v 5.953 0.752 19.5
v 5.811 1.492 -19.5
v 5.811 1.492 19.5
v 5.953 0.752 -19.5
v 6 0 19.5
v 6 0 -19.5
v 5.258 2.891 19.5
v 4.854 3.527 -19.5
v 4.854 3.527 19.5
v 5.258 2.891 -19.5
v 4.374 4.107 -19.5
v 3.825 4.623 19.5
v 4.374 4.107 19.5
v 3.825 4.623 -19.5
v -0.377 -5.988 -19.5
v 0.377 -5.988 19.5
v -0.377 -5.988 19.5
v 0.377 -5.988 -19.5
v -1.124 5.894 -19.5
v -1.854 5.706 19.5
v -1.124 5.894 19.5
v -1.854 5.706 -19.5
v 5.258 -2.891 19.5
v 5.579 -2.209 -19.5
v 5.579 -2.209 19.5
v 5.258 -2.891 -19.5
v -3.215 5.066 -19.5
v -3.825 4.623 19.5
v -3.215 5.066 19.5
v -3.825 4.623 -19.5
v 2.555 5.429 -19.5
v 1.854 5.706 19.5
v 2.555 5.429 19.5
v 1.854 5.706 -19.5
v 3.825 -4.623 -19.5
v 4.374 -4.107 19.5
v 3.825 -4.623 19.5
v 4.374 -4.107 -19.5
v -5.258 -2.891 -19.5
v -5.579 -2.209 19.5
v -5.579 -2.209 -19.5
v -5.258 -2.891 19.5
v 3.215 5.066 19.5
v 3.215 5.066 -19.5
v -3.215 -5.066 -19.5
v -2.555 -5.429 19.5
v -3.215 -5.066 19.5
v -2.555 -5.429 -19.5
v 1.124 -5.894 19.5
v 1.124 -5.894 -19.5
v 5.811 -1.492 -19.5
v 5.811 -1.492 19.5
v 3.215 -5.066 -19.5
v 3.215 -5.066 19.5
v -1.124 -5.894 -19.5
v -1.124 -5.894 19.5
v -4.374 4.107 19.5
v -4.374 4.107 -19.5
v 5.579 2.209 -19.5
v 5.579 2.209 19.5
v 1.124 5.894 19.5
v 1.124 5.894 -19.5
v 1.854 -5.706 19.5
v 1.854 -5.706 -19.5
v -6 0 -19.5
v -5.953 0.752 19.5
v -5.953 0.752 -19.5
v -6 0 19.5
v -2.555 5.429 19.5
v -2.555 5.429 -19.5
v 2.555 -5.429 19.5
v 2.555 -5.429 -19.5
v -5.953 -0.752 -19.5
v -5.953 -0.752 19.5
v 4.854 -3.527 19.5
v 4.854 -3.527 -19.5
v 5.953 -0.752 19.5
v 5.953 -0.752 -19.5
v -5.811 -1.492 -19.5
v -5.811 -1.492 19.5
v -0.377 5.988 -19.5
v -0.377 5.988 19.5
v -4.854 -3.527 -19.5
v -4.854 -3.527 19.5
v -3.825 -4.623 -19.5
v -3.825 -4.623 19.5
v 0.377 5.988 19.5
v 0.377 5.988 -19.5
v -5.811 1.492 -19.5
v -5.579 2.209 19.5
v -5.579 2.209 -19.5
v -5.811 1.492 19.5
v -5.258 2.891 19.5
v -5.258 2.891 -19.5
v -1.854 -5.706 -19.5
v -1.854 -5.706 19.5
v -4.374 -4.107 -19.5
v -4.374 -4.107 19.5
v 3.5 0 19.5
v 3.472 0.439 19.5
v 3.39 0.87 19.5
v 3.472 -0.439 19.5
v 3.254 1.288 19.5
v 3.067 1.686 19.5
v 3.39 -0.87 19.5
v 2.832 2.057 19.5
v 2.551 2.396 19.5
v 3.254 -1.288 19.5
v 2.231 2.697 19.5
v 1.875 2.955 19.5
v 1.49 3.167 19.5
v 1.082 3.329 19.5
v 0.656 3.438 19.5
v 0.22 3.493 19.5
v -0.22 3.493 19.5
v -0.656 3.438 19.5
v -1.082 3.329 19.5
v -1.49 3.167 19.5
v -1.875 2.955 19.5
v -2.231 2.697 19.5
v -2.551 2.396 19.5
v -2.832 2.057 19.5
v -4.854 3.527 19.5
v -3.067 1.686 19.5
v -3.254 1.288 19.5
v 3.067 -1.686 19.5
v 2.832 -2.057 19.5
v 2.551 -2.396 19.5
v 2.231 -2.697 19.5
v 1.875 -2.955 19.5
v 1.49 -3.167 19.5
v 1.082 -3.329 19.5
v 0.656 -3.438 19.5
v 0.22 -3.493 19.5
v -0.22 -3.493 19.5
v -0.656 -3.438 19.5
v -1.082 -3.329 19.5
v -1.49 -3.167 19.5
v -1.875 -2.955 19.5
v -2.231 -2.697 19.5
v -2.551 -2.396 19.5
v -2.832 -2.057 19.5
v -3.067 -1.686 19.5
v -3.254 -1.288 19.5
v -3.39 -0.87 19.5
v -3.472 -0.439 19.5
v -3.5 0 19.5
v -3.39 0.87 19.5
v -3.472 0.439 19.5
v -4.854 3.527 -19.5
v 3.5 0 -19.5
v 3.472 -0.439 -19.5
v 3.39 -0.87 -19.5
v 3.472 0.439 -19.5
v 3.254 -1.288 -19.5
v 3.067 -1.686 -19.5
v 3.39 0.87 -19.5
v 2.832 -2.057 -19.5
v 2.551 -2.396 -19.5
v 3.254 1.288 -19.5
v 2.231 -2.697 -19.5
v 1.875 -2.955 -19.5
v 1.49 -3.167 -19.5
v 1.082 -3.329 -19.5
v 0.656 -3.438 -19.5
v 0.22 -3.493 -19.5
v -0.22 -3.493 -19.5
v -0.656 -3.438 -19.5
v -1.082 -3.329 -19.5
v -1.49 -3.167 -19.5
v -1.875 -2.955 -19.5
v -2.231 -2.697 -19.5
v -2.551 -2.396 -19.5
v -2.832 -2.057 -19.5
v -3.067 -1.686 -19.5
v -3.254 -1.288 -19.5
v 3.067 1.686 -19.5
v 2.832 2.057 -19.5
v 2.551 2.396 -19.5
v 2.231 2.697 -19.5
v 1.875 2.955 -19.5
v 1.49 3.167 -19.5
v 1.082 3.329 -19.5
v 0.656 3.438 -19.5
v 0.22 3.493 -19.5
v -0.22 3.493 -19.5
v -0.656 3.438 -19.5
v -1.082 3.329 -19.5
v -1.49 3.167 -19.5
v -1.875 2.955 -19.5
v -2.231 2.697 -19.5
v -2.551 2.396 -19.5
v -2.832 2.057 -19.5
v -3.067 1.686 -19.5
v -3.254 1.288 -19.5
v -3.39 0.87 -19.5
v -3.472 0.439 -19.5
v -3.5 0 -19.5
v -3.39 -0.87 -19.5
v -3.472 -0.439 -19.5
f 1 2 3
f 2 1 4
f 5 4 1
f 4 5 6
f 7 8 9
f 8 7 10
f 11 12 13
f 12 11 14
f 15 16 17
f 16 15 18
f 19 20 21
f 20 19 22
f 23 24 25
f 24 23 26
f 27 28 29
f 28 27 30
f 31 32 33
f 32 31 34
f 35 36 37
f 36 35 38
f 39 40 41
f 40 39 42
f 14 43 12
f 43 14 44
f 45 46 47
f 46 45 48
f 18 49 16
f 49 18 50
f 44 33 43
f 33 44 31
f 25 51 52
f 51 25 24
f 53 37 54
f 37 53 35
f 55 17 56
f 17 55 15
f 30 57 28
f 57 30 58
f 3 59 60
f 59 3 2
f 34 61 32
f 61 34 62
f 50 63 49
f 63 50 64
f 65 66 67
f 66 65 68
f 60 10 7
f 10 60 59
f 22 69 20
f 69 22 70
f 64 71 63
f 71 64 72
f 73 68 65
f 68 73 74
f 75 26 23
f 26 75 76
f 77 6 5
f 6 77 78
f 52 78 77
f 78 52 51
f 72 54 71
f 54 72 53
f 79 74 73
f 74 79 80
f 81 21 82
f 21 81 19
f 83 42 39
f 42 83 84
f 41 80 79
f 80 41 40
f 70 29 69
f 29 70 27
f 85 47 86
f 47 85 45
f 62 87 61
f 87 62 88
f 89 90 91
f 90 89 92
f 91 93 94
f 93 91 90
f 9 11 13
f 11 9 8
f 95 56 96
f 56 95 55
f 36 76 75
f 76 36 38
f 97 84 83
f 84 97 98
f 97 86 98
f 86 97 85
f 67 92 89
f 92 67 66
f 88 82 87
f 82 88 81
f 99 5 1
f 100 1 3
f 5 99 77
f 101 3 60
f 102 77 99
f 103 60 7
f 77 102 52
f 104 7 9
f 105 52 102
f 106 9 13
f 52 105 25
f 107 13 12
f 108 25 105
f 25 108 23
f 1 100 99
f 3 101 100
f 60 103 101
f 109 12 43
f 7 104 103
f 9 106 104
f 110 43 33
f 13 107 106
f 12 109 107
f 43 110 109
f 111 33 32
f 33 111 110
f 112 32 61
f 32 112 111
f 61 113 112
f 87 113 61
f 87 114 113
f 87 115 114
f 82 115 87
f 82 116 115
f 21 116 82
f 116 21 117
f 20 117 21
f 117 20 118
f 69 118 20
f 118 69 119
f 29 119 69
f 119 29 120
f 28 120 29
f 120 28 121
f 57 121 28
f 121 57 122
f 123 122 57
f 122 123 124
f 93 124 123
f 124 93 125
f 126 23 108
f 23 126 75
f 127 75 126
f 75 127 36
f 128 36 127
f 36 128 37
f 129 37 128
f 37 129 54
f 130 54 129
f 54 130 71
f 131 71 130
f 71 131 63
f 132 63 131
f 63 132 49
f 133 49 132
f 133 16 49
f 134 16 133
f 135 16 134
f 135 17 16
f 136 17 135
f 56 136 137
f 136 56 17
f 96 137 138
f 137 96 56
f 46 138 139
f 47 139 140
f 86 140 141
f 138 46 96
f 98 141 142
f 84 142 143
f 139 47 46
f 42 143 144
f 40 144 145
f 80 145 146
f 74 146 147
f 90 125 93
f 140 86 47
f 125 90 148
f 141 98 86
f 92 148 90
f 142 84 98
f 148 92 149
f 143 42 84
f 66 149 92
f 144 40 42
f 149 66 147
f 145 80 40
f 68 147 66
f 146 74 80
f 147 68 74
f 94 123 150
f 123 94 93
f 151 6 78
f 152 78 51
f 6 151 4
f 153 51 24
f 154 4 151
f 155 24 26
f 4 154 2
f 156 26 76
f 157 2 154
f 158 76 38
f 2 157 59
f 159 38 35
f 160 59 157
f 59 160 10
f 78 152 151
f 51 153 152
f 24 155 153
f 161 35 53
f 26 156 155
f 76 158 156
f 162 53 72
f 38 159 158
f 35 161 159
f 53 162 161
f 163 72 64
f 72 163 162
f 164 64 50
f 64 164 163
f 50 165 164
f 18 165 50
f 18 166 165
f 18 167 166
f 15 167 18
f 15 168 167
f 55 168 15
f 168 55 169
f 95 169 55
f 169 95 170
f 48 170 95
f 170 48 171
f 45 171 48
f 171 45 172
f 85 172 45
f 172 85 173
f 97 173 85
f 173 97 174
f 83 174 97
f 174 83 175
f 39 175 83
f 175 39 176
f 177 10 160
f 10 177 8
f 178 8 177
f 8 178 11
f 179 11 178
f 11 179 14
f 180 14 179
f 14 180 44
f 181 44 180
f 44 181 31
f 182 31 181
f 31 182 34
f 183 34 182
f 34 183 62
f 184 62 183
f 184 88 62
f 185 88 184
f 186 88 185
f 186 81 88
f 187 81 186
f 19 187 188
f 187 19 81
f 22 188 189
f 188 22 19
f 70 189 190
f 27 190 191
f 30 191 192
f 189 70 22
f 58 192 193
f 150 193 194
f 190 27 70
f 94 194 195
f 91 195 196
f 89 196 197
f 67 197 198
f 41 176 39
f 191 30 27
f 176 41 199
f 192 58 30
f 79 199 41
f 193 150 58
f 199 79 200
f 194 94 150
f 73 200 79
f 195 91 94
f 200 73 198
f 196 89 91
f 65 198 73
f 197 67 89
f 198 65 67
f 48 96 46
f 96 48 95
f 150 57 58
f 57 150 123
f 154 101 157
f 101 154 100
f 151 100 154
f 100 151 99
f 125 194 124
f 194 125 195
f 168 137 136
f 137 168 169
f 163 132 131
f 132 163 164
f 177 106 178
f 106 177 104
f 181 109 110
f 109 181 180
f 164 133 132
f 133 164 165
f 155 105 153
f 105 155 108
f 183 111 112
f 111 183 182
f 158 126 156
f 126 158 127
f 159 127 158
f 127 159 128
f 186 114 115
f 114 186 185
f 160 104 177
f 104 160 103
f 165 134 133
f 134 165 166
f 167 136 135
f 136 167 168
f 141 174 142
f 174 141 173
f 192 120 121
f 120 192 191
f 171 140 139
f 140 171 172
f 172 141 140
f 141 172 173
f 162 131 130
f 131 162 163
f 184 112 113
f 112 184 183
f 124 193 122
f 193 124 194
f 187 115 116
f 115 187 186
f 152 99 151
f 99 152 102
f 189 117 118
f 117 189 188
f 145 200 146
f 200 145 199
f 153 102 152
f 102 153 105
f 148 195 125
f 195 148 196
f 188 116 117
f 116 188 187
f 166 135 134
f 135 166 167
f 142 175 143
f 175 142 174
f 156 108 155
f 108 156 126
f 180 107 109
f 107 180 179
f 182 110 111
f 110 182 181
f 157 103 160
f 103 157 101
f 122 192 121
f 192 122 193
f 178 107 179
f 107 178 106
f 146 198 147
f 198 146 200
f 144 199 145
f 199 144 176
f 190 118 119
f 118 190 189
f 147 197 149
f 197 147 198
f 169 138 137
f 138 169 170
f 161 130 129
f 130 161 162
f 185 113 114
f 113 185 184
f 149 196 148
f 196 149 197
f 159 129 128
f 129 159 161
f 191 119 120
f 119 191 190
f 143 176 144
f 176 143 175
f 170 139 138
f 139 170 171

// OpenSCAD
$fn = 50;


difference() {
	union() {
		translate(v = [0, 0, -19.5000000000]) {
			cylinder(h = 39, r = 6.0000000000);
		}
	}
	union() {
		translate(v = [0, 0, -100.0000000000]) {
			cylinder(h = 200, r = 3.5000000000);
		}
	}
}
